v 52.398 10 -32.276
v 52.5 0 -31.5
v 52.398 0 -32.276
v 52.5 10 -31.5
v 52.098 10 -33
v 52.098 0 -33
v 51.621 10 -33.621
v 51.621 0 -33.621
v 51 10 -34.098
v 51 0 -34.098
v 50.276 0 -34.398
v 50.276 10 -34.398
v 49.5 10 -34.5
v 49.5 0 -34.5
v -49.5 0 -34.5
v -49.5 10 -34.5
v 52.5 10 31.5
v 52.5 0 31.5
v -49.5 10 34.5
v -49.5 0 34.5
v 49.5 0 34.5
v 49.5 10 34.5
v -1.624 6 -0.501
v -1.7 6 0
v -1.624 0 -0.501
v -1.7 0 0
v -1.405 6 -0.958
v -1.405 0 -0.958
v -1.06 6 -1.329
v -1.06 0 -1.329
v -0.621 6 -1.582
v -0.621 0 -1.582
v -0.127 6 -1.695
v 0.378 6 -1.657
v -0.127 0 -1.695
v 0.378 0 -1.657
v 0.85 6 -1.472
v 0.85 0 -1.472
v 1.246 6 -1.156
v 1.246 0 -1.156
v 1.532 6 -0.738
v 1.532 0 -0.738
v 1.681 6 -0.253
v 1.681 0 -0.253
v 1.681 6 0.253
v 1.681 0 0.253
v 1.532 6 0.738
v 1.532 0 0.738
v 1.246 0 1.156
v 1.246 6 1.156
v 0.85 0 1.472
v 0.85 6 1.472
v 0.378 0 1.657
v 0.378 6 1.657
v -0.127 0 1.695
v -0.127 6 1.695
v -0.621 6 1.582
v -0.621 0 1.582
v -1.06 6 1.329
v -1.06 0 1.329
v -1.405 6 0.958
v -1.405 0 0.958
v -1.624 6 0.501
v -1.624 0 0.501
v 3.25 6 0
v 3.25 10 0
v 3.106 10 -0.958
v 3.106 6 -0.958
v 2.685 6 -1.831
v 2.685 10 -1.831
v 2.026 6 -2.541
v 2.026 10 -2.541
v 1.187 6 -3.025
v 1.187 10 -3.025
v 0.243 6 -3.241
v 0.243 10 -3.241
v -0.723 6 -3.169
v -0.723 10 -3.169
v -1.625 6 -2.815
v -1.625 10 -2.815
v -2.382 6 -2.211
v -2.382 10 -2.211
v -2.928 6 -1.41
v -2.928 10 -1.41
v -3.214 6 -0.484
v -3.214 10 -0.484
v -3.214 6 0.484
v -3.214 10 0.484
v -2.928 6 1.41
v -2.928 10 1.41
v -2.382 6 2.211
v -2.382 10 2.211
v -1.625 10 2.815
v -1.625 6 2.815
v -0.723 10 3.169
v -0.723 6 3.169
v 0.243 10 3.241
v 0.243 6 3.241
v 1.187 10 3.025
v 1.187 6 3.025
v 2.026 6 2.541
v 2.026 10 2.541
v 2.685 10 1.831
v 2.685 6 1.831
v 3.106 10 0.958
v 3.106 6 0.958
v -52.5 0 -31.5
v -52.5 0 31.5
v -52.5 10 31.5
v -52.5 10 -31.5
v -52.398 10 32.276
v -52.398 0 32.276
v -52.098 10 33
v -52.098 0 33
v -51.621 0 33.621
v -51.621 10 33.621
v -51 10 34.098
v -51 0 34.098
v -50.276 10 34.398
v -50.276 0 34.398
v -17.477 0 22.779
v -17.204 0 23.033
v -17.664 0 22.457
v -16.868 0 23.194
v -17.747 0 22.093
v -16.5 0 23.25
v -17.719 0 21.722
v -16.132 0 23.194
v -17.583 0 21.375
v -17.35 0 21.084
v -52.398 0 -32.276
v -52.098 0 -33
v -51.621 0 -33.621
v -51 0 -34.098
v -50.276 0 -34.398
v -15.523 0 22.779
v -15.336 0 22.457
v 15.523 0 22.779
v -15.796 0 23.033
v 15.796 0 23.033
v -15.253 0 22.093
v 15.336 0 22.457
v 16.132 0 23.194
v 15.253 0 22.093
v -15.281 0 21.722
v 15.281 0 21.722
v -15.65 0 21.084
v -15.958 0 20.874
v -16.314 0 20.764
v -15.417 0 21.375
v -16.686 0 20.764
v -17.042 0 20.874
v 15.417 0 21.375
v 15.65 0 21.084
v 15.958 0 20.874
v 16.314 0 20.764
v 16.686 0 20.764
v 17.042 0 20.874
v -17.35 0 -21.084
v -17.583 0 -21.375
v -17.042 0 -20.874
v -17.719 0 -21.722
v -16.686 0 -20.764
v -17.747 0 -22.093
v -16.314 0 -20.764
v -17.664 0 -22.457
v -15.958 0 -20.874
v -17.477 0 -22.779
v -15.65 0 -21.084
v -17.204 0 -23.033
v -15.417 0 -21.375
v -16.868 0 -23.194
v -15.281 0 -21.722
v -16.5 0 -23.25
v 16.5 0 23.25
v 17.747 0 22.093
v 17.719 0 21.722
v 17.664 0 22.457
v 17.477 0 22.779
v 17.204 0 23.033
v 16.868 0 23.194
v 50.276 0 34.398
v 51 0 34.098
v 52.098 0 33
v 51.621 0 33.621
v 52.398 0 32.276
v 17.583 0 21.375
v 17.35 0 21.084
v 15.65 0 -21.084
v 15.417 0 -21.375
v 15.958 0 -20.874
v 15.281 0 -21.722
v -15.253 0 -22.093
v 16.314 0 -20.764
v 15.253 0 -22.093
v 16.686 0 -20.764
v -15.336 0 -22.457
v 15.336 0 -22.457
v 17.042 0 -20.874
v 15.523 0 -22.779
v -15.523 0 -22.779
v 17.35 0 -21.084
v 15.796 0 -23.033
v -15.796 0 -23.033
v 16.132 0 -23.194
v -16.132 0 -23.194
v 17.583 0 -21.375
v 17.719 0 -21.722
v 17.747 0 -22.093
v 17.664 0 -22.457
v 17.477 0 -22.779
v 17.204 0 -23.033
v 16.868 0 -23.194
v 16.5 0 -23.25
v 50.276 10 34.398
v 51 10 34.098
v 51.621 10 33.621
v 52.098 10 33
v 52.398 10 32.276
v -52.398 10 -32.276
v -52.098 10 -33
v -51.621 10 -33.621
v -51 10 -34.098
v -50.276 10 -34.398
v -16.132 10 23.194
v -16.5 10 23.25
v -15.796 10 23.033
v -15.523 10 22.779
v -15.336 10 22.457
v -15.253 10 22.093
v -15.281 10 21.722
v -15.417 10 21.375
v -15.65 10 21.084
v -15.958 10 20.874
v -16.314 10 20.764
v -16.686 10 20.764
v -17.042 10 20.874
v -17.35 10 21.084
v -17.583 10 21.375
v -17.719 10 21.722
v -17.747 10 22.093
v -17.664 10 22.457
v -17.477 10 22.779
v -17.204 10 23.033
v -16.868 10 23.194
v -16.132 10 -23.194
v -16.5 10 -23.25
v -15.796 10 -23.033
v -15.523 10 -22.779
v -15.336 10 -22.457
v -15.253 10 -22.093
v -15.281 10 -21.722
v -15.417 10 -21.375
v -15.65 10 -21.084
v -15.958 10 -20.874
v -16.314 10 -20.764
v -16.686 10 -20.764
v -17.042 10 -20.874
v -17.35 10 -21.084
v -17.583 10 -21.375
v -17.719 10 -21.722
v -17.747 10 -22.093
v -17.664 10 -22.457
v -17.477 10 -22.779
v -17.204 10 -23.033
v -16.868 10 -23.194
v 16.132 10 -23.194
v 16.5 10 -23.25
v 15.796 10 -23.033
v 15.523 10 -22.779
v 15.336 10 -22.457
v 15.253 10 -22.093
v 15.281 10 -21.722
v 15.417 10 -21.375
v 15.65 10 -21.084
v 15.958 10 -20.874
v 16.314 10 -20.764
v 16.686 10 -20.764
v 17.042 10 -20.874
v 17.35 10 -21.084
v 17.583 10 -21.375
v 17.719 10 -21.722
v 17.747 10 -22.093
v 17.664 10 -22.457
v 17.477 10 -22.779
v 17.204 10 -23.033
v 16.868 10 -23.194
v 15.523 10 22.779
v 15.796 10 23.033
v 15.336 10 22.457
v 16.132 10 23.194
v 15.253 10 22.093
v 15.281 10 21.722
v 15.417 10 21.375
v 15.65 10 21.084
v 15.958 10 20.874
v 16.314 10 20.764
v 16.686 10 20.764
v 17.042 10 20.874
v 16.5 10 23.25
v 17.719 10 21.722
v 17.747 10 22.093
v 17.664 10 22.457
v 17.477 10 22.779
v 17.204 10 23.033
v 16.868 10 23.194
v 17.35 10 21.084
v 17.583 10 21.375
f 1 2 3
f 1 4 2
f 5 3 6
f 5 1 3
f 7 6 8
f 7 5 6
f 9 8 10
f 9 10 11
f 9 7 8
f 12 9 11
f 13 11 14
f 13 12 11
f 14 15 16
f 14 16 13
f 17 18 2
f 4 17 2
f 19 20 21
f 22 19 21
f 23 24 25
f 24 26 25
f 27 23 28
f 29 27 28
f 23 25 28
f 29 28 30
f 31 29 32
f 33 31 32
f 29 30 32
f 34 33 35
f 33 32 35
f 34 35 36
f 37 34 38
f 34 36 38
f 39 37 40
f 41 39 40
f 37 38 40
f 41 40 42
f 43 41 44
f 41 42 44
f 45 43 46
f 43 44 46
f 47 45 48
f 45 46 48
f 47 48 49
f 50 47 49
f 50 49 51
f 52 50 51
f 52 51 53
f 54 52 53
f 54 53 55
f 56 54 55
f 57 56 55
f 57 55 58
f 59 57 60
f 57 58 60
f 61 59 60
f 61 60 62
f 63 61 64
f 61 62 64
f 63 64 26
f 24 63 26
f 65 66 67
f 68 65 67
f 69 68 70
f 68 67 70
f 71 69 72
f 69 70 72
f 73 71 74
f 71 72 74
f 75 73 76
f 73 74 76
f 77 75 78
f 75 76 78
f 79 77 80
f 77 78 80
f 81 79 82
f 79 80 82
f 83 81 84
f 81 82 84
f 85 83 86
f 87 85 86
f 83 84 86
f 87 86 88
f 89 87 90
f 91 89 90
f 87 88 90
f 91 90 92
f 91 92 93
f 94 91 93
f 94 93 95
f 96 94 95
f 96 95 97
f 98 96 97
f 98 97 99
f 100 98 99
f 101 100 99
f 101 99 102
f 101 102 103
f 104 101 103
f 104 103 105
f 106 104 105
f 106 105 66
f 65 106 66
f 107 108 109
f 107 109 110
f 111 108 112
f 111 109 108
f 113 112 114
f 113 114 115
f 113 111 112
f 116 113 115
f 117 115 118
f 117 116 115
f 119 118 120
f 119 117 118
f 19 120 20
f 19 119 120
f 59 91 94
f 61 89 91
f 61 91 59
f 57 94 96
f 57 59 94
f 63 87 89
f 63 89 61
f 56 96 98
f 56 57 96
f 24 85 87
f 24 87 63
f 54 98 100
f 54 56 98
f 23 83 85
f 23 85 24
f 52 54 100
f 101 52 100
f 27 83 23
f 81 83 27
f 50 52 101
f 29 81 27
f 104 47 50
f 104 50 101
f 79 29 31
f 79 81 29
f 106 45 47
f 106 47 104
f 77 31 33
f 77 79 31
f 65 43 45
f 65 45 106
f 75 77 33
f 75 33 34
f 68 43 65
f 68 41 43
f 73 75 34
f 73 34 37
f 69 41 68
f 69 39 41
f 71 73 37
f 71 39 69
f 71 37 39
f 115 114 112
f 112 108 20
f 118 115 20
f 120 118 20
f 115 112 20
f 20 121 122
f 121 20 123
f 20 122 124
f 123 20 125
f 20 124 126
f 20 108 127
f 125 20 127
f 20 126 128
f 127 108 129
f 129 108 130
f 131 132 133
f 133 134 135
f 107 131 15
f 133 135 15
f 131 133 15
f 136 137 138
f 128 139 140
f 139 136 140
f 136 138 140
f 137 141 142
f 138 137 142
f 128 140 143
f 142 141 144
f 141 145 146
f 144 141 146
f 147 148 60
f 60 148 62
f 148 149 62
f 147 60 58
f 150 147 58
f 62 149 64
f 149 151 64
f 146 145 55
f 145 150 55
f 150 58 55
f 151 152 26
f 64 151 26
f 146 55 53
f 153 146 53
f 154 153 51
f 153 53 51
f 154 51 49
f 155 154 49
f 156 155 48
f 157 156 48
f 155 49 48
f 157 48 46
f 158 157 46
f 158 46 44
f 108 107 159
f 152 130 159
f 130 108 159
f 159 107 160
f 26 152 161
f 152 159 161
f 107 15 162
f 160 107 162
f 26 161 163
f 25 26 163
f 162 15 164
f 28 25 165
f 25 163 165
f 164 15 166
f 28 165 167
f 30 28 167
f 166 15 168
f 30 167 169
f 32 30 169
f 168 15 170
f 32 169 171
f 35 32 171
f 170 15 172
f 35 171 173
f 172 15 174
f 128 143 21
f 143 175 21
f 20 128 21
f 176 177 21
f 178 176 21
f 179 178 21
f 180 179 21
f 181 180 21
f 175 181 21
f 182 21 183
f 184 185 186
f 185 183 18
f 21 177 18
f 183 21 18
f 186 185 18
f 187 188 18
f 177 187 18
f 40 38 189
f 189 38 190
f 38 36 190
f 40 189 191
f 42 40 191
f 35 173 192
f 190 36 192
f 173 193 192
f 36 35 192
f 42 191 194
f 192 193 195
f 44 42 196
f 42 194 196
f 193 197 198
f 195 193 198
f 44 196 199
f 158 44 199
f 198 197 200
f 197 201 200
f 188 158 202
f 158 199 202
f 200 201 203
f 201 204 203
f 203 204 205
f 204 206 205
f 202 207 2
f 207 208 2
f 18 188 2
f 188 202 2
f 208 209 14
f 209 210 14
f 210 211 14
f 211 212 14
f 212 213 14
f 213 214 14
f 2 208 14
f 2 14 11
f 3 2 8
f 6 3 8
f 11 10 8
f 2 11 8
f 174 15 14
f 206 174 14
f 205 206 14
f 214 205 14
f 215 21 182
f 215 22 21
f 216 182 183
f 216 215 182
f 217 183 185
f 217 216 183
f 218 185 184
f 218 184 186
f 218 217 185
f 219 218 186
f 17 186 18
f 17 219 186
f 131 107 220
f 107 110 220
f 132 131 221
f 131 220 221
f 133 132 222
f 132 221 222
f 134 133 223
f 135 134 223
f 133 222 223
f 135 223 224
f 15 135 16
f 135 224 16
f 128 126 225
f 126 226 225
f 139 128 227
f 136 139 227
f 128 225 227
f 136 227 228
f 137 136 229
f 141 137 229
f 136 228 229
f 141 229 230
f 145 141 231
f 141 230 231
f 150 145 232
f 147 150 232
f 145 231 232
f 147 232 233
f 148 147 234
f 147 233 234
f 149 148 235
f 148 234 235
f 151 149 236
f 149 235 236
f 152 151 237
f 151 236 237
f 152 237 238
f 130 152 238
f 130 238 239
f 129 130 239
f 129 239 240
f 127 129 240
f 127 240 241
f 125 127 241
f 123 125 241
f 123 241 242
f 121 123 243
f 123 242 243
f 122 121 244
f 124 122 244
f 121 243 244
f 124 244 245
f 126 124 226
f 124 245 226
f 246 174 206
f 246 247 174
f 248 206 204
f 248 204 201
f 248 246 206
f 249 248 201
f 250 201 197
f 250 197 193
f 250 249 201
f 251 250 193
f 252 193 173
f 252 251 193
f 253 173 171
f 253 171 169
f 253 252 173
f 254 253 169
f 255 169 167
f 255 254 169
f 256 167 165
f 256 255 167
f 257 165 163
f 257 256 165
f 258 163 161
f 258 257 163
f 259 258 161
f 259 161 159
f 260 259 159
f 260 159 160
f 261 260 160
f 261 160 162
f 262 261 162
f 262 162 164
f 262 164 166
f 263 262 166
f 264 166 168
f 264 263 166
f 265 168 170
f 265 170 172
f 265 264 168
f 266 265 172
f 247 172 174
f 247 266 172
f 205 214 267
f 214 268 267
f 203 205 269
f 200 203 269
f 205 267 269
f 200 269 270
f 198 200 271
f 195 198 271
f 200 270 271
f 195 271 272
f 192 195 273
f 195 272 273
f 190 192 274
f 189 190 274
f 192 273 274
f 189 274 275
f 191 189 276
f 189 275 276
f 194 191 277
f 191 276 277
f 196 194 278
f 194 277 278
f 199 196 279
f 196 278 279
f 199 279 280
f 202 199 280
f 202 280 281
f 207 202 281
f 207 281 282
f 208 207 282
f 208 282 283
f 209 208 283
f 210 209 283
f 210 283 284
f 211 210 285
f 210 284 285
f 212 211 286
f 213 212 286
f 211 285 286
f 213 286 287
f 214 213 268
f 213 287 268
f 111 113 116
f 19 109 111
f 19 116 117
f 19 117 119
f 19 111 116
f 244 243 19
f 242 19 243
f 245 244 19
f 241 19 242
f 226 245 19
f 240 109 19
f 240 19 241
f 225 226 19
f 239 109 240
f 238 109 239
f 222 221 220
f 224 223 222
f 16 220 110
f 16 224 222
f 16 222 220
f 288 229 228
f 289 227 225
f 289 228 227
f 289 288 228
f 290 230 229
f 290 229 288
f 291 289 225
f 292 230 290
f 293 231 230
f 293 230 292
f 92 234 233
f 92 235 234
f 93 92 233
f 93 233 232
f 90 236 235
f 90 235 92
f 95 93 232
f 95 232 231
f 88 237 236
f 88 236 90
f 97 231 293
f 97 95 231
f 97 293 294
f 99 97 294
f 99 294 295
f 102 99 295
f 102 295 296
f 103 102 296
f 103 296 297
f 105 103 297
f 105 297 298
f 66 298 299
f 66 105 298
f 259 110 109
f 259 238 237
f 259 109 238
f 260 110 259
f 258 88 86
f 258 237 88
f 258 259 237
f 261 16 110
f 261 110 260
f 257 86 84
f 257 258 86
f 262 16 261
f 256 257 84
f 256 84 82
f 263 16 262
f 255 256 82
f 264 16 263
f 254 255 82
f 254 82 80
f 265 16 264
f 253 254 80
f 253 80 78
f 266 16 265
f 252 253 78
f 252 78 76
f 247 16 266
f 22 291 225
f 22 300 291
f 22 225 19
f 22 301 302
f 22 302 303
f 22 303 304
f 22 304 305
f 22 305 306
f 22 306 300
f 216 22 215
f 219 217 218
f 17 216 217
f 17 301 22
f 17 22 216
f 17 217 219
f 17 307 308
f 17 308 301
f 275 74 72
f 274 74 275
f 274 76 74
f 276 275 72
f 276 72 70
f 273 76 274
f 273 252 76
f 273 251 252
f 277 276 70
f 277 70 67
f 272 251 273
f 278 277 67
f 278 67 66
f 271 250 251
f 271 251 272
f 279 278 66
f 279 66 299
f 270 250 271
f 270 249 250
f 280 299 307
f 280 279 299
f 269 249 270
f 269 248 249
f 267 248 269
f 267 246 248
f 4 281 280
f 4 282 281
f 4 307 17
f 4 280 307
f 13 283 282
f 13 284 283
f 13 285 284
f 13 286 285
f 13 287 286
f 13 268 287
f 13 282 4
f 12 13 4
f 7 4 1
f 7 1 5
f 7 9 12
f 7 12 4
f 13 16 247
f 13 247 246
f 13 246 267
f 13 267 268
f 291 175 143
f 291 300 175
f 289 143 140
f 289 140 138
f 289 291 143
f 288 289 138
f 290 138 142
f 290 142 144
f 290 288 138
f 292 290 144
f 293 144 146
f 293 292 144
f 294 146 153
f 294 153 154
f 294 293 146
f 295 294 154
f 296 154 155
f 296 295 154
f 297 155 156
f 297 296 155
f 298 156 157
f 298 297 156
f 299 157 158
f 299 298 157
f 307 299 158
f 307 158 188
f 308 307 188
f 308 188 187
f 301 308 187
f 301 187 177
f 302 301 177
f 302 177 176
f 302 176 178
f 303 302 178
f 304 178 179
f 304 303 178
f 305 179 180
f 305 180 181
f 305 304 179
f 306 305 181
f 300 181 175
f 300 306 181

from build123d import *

# Parameters (mm, degrees)
SKETCH1_W                      = 105
SKETCH1_H                      = 69
BOSS_EXTRUDE1_DEPTH            = 10
FILLET1_R                      = 3
CBORE_FOR_M3_SHCS1_D           = 3.4
CBORE_FOR_M3_SHCS1_CBORE_D     = 6.5
CBORE_FOR_M3_SHCS1_CBORE_DEPTH = 4


with BuildPart() as part:
    # Sketch1 → Boss-Extrude1 (new body)
    with BuildSketch(Plane(origin=(0, 0, 0), x_dir=(1, 0, 0), z_dir=(0, 1, 0))):
        Rectangle(SKETCH1_W, SKETCH1_H)
    extrude(amount=BOSS_EXTRUDE1_DEPTH)

    # Fillet1
    fillet1_edges = [part.edges().sort_by_distance(p)[0] for p in [
        (52.5, 5, 34.5),
        (-52.5, 5, 34.5),
        (-52.5, 5, -34.5),
        (52.5, 5, -34.5),
    ]]
    fillet(fillet1_edges, radius=FILLET1_R)

    # CBORE for M3 SHCS1 (through all)
    with Locations(Plane(origin=(0, 10, 0), x_dir=(1, 0, 0), z_dir=(0, 1, 0))):
        with Locations((0, 0)):
            CounterBoreHole(CBORE_FOR_M3_SHCS1_D / 2, CBORE_FOR_M3_SHCS1_CBORE_D / 2, CBORE_FOR_M3_SHCS1_CBORE_DEPTH)

    # Sketch5 → M3x0.5 Tapped Hole1 (revolve, cut)
    with BuildSketch(Plane(origin=(16.5, 10, 22), x_dir=(0, 0, 1), z_dir=(1, 0, 0))):
        Polygon((0, 0), (0, 10.751075774), (1.25, 10), (1.25, 0), align=None)
    m3x0_5_tapped_hole1 = revolve(axis=Axis((16.5, 16.35, 22), (0, -1, 0)), mode=Mode.SUBTRACT)

    # Mirror1: M3x0.5 Tapped Hole1 across plane
    add(m3x0_5_tapped_hole1.mirror(Plane(origin=(0, 0, 0), x_dir=(0, 0, 1), z_dir=(1, 0, 0))), mode=Mode.SUBTRACT)

    # Mirror2: M3x0.5 Tapped Hole1 across plane
    add(m3x0_5_tapped_hole1.mirror(Plane.XY), mode=Mode.SUBTRACT)

    # Mirror2 copy 1 sketch → Mirror2 copy 1 (revolve, cut)
    with BuildSketch(Plane(origin=(-16.5, 10, -22), x_dir=(0, 0, -1), z_dir=(-1, 0, 0))):
        Polygon((0, 0), (0, 10.751075774), (1.25, 10), (1.25, 0), align=None)
    revolve(axis=Axis((-16.5, 16.35, -22), (0, -1, 0)), mode=Mode.SUBTRACT)


solid = part.part
